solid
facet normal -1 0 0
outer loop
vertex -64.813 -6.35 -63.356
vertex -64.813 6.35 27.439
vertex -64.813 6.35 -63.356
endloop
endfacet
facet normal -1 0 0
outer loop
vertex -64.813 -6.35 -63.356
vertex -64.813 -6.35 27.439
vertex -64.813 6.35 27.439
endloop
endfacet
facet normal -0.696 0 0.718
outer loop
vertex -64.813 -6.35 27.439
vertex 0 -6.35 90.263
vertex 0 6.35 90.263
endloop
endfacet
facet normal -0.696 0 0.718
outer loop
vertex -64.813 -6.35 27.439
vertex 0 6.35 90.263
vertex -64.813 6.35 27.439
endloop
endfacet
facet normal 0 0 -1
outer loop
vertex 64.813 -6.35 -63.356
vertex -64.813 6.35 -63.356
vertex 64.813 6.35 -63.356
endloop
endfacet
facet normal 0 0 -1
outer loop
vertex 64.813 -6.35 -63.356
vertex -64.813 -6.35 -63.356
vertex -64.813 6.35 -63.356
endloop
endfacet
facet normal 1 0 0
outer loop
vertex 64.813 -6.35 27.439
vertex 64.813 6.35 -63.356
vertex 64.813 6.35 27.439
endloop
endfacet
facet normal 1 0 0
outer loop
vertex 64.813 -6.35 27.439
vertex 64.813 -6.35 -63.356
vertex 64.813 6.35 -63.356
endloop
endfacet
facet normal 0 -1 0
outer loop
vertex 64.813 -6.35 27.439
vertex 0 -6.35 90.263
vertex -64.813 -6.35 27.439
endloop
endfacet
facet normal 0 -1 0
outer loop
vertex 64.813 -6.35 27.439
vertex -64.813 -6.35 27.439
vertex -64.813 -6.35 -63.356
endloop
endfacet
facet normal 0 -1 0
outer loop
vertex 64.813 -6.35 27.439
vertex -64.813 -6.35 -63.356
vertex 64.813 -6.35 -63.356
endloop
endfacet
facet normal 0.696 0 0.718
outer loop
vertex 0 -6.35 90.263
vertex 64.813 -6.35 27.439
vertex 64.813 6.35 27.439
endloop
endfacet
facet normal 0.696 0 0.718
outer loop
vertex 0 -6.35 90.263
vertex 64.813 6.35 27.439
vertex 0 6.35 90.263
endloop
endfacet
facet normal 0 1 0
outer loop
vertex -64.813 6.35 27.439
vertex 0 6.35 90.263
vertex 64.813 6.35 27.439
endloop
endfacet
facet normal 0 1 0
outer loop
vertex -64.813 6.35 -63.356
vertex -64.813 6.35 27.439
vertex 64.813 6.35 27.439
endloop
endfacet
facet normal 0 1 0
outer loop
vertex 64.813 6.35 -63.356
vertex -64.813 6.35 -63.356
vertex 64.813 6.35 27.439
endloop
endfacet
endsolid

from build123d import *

# Parameters (mm, degrees)
F1_DEPTH = 6.35


with BuildPart() as f1:
    # F0 (on Front) → F1 (new body, symmetric)
    with BuildSketch(Plane.XZ):
        with BuildLine():
            Line((-39.895691, -12.556188), (-39.895691, -63.356188))
            Line((-39.895691, -63.356188), (4.725324, -63.356188))
            Line((4.725324, -63.356188), (4.725324, -12.556188))
            ThreePointArc((4.725324, -12.556188), (-17.585183, 9.754319), (-39.895691, -12.556188))
        make_face()
        Polygon((0, 90.262515), (-64.81318, 27.438652), (64.81318, 27.438652), align=None)
        with BuildLine():
            Line((-64.81318, 27.438652), (-64.81318, -63.356188))
            Line((-64.81318, -63.356188), (-39.895691, -63.356188))
            Line((-39.895691, -63.356188), (-39.895691, -12.556188))
            ThreePointArc((-39.895691, -12.556188), (-17.585183, 9.754319), (4.725324, -12.556188))
            Line((4.725324, -12.556188), (4.725324, -63.356188))
            Line((4.725324, -63.356188), (64.81318, -63.356188))
            Line((64.81318, -63.356188), (64.81318, 27.438652))
            Line((64.81318, 27.438652), (-64.81318, 27.438652))
        make_face()
    extrude(amount=F1_DEPTH, both=True)


solid = f1.part
